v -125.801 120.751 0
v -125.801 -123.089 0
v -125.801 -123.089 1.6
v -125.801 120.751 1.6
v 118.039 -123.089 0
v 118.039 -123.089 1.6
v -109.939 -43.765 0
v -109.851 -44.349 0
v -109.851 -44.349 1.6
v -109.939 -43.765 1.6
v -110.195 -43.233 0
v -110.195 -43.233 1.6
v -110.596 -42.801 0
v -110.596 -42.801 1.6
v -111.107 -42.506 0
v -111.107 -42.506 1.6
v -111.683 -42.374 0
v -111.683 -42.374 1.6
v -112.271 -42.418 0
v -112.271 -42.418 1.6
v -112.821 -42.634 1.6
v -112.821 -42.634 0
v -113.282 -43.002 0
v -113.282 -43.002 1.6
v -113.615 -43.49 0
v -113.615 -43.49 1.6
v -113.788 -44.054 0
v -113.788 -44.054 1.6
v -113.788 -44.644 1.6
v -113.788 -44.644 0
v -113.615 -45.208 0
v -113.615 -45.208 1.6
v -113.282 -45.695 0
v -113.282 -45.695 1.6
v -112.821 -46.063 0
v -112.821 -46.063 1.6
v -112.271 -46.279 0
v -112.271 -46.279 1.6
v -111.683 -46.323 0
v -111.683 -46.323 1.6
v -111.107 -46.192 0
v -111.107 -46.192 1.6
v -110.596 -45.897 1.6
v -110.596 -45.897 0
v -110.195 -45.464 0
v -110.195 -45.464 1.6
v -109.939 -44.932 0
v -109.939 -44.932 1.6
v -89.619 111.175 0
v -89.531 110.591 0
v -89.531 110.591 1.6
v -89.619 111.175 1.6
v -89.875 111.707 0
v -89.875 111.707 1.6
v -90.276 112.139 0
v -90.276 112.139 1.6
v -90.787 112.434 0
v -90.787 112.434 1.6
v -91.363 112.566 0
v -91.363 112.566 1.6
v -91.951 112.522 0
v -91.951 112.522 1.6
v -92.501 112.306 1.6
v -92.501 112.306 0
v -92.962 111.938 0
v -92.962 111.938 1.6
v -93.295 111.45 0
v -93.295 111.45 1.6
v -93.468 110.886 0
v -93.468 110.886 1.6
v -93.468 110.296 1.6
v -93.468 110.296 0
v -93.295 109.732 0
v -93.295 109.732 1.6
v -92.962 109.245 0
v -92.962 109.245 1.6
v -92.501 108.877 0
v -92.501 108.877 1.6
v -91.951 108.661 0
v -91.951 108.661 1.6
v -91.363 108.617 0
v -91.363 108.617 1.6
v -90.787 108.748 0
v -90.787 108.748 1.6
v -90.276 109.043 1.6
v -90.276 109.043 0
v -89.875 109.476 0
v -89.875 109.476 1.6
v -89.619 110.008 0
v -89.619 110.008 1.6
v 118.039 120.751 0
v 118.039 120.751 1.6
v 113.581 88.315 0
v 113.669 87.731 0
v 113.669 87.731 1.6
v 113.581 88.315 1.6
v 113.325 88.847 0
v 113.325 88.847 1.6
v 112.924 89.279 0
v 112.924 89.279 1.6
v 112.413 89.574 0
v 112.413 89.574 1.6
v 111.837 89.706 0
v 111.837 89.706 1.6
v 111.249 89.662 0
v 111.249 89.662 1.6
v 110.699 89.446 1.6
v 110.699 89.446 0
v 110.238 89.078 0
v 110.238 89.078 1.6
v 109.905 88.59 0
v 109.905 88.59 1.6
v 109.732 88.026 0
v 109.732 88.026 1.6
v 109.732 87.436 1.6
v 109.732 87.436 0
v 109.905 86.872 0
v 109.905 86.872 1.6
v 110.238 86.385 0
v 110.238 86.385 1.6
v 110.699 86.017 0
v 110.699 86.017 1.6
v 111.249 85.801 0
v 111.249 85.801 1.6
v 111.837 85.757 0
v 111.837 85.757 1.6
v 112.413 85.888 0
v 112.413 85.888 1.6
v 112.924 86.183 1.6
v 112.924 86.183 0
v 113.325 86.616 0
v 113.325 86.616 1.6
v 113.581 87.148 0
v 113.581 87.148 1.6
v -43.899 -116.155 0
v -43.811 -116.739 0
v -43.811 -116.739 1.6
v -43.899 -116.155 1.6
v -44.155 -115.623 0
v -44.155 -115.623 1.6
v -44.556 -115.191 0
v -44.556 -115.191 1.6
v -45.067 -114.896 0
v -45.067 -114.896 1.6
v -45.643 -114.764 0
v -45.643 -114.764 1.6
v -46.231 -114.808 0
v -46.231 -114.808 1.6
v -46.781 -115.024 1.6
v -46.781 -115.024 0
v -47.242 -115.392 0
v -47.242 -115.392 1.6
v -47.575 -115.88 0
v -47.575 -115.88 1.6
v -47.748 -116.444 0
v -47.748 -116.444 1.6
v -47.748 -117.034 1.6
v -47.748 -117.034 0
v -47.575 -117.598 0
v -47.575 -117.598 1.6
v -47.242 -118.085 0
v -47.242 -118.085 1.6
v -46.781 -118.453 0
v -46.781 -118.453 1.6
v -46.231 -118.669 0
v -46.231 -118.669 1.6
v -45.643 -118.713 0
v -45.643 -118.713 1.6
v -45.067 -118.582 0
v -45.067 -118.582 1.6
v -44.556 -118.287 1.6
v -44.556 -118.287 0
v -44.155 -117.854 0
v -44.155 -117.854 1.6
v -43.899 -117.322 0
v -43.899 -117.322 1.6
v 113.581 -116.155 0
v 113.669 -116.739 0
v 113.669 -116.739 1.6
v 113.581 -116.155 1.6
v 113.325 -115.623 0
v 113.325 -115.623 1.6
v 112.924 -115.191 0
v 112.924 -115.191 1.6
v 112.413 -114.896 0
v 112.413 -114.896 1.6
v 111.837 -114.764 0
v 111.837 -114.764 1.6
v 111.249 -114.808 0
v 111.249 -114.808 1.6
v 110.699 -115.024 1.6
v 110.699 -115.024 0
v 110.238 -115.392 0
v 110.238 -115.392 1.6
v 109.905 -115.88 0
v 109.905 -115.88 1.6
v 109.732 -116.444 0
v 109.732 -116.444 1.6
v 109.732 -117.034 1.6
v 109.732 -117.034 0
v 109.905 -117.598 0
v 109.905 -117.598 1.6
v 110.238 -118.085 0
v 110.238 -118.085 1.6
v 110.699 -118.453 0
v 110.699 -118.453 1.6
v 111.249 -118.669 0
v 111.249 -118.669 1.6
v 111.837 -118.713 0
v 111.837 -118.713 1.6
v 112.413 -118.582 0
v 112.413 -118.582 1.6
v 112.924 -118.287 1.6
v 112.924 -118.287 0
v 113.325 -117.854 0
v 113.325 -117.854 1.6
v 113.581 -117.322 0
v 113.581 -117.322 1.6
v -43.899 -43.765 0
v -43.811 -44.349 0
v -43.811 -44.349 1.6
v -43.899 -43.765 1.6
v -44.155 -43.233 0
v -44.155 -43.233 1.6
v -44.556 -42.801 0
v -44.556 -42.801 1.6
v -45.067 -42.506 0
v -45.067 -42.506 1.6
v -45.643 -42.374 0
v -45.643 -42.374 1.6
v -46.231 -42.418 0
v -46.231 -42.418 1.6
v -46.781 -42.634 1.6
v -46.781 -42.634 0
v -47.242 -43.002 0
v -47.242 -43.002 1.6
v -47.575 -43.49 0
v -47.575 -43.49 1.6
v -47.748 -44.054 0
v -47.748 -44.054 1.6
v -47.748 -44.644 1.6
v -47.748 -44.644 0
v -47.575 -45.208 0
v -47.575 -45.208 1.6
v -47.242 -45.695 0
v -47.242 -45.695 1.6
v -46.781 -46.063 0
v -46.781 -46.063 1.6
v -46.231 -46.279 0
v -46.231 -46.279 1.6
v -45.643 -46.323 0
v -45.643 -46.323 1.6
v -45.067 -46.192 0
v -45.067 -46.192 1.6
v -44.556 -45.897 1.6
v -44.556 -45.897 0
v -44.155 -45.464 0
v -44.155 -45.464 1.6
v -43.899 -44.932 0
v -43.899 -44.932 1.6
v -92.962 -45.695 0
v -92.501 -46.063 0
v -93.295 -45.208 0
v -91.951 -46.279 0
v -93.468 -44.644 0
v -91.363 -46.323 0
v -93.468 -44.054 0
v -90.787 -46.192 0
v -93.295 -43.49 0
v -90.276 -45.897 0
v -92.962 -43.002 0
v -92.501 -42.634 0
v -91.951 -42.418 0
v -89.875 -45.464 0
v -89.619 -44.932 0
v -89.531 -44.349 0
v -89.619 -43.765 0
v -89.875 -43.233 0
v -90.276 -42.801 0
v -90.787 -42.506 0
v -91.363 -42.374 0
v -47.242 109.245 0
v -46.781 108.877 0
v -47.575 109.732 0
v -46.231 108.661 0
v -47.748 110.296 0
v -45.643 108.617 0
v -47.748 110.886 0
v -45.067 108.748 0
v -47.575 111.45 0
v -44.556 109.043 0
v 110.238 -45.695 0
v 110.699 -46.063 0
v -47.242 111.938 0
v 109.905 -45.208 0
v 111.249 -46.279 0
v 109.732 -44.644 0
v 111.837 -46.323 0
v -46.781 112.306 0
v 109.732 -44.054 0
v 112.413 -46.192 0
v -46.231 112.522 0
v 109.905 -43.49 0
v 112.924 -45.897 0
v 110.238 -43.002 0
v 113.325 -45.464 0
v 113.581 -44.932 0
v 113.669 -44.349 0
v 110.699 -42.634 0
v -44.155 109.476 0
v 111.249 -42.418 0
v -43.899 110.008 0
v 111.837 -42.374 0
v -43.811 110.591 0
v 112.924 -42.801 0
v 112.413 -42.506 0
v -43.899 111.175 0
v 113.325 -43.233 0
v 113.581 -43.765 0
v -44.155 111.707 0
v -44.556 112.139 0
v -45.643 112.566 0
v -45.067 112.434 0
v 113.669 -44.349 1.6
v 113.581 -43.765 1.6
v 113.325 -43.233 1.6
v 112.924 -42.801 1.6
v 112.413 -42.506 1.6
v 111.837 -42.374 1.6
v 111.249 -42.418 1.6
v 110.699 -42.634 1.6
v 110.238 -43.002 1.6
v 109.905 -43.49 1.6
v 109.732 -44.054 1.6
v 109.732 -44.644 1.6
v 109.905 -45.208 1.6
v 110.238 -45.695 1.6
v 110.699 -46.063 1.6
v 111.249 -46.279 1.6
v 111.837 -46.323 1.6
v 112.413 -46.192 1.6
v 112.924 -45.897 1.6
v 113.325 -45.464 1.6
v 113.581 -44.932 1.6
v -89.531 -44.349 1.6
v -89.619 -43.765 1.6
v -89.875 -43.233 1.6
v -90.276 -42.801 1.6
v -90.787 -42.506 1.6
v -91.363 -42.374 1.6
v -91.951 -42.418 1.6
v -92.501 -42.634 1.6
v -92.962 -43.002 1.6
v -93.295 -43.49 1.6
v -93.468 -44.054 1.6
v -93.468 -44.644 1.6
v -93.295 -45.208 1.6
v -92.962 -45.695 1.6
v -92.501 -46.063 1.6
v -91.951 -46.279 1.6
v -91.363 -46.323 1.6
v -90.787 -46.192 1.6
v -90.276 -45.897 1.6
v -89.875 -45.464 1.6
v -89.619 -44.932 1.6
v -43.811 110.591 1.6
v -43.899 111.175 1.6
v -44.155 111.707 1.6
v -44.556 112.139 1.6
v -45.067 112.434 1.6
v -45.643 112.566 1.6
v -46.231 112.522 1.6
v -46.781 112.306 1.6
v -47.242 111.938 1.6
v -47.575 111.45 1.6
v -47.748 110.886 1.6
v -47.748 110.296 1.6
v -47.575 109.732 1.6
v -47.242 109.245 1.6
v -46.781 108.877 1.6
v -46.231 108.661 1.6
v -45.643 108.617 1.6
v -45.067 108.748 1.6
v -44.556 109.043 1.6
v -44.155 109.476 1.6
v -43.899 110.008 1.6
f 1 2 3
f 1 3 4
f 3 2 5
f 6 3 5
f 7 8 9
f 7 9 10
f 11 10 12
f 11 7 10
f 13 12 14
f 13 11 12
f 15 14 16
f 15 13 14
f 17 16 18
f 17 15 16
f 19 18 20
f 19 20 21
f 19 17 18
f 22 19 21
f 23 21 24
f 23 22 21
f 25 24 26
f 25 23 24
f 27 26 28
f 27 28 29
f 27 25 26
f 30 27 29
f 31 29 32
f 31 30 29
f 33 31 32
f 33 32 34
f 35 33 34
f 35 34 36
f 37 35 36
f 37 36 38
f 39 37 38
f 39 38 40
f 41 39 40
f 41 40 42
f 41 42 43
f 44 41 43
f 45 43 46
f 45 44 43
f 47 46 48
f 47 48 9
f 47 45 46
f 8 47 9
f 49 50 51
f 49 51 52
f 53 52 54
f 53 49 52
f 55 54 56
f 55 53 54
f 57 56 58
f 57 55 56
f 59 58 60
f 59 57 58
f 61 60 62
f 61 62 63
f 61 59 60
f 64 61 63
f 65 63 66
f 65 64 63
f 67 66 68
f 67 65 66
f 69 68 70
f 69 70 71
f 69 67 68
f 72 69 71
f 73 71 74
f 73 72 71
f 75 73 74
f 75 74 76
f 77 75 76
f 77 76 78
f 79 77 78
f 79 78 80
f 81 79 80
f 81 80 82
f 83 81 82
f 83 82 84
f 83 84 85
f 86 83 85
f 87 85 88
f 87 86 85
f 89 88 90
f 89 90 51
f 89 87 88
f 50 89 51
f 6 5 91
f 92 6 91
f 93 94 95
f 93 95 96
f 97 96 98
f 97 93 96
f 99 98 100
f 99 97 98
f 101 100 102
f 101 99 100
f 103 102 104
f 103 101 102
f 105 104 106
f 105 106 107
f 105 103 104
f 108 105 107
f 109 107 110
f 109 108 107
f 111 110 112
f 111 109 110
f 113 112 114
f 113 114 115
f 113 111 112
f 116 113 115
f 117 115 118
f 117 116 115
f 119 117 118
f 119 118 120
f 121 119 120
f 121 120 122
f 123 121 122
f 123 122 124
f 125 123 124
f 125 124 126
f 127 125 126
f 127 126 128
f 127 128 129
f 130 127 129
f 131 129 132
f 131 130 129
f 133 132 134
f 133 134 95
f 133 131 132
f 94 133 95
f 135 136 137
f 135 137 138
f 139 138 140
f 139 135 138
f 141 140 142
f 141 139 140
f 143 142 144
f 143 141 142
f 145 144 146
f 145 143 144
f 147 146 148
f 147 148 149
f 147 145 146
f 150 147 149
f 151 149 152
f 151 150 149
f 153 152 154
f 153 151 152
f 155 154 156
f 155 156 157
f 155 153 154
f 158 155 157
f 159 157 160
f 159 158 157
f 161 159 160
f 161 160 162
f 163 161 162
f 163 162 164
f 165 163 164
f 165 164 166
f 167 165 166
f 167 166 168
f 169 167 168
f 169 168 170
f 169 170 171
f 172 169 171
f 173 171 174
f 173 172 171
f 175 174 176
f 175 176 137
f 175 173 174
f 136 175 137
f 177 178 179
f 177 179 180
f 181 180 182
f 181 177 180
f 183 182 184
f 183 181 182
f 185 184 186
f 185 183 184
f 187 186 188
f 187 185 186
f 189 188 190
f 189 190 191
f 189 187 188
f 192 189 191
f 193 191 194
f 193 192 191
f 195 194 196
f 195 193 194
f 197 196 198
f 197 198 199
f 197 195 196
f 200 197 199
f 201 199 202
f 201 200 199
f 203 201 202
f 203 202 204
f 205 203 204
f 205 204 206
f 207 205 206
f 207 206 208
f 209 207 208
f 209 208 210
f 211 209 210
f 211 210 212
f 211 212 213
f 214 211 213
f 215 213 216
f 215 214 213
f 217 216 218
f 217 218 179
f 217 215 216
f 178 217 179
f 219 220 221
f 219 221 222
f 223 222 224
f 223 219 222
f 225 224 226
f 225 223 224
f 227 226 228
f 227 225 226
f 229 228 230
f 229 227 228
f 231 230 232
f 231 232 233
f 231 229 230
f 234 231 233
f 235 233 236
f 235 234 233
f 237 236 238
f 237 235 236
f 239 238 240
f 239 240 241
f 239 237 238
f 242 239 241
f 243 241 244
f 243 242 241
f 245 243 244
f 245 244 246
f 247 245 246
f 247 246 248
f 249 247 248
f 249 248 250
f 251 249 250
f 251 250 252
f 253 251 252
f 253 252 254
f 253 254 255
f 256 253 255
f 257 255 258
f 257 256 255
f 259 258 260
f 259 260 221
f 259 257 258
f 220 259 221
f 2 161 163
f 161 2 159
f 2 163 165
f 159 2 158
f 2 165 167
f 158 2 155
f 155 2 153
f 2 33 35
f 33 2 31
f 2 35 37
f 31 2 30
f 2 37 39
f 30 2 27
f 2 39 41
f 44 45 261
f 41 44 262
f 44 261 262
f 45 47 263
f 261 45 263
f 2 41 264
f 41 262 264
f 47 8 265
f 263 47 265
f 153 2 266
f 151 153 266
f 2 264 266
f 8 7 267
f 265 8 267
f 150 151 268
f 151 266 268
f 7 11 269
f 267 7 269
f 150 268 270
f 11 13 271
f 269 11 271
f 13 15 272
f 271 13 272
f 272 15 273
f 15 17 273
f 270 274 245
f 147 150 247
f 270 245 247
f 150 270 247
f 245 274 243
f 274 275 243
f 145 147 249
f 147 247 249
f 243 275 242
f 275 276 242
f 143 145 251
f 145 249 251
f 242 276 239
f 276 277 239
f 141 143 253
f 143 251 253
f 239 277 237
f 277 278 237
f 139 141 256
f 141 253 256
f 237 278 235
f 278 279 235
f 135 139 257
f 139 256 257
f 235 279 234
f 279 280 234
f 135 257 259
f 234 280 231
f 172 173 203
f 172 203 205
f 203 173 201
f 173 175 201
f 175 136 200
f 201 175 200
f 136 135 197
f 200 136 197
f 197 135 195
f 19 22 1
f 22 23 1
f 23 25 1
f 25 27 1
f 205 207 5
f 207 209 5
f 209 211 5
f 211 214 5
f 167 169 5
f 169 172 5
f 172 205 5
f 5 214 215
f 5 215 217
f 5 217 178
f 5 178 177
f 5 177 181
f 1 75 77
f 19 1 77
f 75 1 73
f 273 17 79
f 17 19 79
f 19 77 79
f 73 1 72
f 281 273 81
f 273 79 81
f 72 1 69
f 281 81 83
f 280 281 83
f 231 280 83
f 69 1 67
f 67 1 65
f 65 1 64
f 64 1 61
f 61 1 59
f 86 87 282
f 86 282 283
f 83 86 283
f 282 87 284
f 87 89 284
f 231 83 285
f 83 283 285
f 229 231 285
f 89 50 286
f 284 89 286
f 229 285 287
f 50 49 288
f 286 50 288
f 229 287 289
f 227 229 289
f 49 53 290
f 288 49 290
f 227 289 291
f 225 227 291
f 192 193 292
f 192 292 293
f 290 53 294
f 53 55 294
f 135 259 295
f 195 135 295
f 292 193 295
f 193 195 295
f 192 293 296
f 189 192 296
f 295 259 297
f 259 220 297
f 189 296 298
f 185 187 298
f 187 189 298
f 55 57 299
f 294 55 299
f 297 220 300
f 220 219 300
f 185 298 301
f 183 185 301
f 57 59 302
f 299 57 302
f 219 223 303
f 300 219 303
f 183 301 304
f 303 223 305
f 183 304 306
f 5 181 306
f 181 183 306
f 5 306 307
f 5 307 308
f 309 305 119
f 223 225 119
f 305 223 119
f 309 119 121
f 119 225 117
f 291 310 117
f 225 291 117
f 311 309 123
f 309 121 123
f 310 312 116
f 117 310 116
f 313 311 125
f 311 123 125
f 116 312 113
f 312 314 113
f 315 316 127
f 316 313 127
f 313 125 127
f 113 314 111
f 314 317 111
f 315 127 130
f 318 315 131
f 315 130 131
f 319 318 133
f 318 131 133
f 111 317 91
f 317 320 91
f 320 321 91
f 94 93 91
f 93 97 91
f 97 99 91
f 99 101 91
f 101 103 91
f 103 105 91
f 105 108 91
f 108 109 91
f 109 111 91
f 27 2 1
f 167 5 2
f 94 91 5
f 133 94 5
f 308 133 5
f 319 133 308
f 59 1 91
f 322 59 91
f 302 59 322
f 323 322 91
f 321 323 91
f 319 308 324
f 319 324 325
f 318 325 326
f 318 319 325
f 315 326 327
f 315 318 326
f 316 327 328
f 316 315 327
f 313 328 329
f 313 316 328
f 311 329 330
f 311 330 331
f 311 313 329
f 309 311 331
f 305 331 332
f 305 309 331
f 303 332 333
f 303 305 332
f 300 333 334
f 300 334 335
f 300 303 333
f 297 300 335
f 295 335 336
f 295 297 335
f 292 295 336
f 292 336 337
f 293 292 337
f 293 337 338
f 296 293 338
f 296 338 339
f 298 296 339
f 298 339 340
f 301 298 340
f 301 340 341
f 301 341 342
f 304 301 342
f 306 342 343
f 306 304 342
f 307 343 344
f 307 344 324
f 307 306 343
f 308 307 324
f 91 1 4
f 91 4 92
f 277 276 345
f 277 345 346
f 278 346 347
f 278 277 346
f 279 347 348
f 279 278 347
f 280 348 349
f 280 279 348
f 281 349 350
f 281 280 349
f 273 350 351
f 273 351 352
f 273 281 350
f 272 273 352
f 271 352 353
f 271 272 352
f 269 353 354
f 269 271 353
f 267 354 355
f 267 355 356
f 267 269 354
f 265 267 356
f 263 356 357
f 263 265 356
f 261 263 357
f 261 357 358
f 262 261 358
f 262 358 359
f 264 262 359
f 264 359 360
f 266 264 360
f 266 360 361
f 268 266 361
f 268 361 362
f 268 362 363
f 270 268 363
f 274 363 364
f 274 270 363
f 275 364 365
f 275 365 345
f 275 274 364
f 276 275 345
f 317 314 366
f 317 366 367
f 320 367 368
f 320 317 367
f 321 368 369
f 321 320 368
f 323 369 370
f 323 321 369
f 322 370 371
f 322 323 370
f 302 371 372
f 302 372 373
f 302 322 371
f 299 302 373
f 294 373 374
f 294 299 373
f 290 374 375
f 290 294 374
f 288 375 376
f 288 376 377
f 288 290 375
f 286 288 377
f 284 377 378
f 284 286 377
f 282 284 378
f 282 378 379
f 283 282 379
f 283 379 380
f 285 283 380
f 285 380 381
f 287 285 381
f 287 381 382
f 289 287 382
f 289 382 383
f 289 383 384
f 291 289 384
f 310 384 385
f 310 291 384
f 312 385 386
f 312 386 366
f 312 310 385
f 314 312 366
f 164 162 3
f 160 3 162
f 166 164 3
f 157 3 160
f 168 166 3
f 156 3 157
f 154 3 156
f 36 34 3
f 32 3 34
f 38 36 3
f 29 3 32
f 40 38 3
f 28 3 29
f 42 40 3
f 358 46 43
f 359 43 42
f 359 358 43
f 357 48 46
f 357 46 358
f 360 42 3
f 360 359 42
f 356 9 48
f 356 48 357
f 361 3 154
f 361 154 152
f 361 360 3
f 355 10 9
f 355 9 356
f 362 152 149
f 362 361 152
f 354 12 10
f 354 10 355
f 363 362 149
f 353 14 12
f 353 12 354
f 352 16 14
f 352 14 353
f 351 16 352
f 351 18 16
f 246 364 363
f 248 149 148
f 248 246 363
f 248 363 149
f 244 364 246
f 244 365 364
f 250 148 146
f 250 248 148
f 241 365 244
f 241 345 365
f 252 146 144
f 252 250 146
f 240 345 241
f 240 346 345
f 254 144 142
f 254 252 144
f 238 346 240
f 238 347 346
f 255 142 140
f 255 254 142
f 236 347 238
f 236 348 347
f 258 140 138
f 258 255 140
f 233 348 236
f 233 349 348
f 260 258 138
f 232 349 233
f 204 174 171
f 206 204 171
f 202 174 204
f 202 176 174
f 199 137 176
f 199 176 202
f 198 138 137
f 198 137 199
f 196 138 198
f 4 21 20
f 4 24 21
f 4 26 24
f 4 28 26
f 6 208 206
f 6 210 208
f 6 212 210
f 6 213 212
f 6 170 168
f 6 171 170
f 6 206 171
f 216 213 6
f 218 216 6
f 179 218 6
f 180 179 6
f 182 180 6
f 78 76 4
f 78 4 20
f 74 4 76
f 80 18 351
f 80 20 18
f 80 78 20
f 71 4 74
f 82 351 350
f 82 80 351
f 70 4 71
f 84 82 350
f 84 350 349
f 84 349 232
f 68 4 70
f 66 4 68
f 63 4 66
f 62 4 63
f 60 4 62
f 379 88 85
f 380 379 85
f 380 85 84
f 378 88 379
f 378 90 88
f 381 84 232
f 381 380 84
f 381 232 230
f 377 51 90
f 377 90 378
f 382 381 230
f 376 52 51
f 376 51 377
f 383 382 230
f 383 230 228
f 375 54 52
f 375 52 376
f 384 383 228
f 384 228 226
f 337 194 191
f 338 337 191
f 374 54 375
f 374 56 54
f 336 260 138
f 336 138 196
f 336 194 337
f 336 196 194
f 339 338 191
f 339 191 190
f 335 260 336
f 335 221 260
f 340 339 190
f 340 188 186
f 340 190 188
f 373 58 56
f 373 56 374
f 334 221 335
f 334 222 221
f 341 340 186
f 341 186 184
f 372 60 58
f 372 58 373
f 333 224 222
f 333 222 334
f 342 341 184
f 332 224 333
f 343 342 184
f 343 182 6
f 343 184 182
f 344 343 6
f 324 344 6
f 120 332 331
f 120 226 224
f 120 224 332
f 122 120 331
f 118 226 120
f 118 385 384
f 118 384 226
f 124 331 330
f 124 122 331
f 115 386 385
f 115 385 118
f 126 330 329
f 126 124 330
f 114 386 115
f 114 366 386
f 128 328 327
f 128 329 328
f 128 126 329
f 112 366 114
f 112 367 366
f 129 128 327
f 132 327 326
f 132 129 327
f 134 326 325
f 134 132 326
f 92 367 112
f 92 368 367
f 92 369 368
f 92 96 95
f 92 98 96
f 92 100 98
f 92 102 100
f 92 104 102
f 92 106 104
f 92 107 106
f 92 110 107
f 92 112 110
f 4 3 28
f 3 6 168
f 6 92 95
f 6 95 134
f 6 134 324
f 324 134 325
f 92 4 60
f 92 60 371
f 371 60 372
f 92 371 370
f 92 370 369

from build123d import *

# Parameters (mm, degrees)
F0_W     = 243.84
F0_H     = 243.84
F0_R     = 1.98
F1_DEPTH = 1.6


with BuildPart() as f1:
    # F0 (on Top) → F1 (new body)
    with BuildSketch(Plane.XY):
        with Locations((-3.880608, -1.168686)):
            Rectangle(F0_W, F0_H)
        with Locations((-45.790608, -116.738686)):
            Circle(F0_R, mode=Mode.SUBTRACT)
        with Locations((-111.830608, -44.348686)):
            Circle(F0_R, mode=Mode.SUBTRACT)
        with Locations((-91.510608, -44.348686)):
            Circle(F0_R, mode=Mode.SUBTRACT)
        with Locations((-45.790608, -44.348686)):
            Circle(F0_R, mode=Mode.SUBTRACT)
        with Locations((111.689392, -116.738686)):
            Circle(F0_R, mode=Mode.SUBTRACT)
        with Locations((111.689392, -44.348686)):
            Circle(F0_R, mode=Mode.SUBTRACT)
        with Locations((-91.510608, 110.591314)):
            Circle(F0_R, mode=Mode.SUBTRACT)
        with Locations((-45.790608, 110.591314)):
            Circle(F0_R, mode=Mode.SUBTRACT)
        with Locations((111.689392, 87.731314)):
            Circle(F0_R, mode=Mode.SUBTRACT)
    extrude(amount=F1_DEPTH)


solid = f1.part
